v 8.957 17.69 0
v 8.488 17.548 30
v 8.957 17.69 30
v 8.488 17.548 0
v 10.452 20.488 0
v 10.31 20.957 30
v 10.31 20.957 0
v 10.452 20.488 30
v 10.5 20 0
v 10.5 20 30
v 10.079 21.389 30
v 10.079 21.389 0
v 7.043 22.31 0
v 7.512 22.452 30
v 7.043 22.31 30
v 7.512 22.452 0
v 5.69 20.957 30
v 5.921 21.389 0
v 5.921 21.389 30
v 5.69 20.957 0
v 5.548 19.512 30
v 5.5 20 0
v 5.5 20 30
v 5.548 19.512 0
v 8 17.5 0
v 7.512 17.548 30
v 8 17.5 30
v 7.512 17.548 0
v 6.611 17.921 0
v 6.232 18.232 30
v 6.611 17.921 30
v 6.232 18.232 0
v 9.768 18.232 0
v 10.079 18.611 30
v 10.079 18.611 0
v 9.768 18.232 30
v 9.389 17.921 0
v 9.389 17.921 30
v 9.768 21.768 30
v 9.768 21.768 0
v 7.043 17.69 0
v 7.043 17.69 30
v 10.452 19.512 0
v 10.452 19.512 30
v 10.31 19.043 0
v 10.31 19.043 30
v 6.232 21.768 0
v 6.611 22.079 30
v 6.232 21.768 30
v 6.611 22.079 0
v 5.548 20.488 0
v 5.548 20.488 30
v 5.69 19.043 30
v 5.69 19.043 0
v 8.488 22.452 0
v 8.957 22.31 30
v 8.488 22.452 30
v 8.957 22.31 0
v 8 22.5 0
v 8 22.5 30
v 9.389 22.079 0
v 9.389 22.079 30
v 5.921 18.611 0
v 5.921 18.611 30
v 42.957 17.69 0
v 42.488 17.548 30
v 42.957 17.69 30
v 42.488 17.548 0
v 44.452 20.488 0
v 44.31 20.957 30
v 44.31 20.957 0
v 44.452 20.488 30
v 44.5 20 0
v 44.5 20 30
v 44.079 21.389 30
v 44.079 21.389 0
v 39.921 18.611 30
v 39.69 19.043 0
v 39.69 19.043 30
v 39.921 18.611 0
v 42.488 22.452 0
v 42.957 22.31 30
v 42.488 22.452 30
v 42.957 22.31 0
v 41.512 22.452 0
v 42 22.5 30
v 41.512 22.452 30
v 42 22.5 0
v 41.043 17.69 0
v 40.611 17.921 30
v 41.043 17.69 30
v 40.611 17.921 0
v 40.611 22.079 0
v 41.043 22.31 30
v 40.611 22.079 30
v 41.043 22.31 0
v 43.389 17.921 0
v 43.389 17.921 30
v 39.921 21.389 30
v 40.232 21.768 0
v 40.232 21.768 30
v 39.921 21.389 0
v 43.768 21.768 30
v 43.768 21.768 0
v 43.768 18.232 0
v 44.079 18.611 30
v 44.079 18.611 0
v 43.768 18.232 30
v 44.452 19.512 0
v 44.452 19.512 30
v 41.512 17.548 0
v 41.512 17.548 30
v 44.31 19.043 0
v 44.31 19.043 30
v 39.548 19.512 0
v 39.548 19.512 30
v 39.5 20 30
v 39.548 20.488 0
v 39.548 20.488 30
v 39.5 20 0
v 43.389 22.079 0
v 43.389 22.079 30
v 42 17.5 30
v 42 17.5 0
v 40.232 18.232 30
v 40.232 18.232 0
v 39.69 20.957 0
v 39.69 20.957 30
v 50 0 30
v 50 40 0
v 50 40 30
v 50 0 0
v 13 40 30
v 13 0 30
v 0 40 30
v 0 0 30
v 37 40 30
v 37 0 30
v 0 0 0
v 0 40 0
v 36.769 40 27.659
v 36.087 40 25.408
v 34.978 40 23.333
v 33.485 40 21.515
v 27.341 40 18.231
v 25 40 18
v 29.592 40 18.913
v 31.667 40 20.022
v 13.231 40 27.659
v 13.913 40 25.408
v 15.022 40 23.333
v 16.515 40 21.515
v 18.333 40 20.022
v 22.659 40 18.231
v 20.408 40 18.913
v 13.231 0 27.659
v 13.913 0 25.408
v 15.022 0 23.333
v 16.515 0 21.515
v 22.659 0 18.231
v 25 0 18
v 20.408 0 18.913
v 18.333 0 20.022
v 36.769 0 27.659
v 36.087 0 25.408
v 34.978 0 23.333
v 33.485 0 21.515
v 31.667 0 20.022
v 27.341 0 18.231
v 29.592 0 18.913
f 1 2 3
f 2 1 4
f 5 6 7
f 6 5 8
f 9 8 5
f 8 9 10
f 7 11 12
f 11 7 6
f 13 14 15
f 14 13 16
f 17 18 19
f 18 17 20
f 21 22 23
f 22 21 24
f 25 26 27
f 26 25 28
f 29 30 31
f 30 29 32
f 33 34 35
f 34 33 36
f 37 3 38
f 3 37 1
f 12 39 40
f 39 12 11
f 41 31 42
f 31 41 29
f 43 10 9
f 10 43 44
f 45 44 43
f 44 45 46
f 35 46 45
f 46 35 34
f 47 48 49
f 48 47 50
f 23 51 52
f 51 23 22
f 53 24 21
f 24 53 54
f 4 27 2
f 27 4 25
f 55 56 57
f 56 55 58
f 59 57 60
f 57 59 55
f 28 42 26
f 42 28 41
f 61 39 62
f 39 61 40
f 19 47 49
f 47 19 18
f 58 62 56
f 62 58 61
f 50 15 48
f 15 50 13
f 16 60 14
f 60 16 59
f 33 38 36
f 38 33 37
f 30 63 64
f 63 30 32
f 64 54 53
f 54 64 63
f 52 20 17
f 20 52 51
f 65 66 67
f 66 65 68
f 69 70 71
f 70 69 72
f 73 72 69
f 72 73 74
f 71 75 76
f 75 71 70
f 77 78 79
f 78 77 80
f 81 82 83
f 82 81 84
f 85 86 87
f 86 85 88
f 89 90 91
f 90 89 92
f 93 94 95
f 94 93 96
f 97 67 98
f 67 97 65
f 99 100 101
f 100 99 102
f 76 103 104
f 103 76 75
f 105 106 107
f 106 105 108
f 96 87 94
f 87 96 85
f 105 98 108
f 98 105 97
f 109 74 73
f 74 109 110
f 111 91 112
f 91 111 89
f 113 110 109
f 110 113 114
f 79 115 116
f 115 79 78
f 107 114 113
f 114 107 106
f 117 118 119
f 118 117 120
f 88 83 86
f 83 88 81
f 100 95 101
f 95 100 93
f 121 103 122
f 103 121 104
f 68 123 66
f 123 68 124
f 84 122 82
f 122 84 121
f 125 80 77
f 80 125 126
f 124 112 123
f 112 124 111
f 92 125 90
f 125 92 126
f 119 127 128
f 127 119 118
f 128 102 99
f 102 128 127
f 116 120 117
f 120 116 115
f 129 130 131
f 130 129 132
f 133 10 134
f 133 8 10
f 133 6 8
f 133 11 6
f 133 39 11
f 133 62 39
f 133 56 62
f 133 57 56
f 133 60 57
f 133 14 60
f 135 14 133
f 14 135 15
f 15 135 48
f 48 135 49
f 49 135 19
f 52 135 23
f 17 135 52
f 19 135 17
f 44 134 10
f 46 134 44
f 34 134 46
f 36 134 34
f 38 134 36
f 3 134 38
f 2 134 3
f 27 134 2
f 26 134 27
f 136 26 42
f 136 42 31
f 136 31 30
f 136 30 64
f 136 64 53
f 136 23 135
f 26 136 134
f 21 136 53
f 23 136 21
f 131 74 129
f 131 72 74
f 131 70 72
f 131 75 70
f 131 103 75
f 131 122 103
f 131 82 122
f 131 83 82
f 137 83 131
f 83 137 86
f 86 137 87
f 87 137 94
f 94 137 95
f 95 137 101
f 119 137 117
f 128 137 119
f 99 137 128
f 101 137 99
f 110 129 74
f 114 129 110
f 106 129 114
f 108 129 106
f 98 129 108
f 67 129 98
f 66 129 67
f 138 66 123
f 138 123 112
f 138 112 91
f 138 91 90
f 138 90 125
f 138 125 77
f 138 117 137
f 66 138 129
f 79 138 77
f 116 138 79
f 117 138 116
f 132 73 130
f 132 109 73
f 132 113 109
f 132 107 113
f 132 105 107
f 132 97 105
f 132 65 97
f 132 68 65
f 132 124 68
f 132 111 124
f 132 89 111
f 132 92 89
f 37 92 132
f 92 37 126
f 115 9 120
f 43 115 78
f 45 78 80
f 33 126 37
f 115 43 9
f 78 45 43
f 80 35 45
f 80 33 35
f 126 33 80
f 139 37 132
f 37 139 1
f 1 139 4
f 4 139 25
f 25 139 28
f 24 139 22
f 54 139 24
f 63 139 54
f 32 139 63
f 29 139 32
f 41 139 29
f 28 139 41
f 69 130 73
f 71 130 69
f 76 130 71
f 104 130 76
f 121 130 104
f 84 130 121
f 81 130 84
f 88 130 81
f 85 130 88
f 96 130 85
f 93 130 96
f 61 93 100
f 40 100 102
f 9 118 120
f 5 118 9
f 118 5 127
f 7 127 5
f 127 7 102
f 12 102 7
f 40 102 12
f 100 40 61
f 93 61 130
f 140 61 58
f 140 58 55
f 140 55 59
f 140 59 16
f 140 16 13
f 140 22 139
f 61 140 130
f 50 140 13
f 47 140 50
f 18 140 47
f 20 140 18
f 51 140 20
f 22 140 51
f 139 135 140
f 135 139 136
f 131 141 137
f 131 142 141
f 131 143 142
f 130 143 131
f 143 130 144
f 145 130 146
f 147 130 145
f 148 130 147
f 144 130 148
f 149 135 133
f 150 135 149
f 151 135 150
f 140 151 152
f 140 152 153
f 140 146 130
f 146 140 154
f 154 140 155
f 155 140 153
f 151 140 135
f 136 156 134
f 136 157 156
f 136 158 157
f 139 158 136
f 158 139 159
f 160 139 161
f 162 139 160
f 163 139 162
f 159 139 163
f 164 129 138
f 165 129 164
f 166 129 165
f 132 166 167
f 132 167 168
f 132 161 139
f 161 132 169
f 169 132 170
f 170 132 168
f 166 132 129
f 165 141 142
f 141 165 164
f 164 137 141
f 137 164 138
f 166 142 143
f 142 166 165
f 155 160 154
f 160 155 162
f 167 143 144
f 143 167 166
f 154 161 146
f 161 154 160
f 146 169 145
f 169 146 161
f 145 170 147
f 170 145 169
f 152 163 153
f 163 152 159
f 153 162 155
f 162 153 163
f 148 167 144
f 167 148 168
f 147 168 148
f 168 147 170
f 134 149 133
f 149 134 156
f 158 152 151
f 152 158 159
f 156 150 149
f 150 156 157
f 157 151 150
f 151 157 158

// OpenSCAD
$fn = 32;

// ----------------------------------------------------------------------
// Saddle clamp: plain shaft clamp
// ----------------------------------------------------------------------

// --- parameters (mm) ---
blk_l = 50;               // block length, X
blk_w = 40;               // block width, Y
blk_h = 30;               // block height
clamp_r = 12;             // shaft groove radius
hole_r = 2.5;             // bolt hole radius
hole_m = 8;               // bolt hole margin from the ends

saw_depth = clamp_r + 3;  // saw kerf depth

difference() {
  cube([blk_l, blk_w, blk_h]);
  translate([blk_l / 2, -1, blk_h])
    rotate([-90, 0, 0])
      cylinder(h = blk_w + 2, r = clamp_r);
  for (sx = [0, 1])
    translate([sx ? blk_l - hole_m : hole_m, blk_w / 2, -1])
      cylinder(r = hole_r, h = blk_h + 2);
}
